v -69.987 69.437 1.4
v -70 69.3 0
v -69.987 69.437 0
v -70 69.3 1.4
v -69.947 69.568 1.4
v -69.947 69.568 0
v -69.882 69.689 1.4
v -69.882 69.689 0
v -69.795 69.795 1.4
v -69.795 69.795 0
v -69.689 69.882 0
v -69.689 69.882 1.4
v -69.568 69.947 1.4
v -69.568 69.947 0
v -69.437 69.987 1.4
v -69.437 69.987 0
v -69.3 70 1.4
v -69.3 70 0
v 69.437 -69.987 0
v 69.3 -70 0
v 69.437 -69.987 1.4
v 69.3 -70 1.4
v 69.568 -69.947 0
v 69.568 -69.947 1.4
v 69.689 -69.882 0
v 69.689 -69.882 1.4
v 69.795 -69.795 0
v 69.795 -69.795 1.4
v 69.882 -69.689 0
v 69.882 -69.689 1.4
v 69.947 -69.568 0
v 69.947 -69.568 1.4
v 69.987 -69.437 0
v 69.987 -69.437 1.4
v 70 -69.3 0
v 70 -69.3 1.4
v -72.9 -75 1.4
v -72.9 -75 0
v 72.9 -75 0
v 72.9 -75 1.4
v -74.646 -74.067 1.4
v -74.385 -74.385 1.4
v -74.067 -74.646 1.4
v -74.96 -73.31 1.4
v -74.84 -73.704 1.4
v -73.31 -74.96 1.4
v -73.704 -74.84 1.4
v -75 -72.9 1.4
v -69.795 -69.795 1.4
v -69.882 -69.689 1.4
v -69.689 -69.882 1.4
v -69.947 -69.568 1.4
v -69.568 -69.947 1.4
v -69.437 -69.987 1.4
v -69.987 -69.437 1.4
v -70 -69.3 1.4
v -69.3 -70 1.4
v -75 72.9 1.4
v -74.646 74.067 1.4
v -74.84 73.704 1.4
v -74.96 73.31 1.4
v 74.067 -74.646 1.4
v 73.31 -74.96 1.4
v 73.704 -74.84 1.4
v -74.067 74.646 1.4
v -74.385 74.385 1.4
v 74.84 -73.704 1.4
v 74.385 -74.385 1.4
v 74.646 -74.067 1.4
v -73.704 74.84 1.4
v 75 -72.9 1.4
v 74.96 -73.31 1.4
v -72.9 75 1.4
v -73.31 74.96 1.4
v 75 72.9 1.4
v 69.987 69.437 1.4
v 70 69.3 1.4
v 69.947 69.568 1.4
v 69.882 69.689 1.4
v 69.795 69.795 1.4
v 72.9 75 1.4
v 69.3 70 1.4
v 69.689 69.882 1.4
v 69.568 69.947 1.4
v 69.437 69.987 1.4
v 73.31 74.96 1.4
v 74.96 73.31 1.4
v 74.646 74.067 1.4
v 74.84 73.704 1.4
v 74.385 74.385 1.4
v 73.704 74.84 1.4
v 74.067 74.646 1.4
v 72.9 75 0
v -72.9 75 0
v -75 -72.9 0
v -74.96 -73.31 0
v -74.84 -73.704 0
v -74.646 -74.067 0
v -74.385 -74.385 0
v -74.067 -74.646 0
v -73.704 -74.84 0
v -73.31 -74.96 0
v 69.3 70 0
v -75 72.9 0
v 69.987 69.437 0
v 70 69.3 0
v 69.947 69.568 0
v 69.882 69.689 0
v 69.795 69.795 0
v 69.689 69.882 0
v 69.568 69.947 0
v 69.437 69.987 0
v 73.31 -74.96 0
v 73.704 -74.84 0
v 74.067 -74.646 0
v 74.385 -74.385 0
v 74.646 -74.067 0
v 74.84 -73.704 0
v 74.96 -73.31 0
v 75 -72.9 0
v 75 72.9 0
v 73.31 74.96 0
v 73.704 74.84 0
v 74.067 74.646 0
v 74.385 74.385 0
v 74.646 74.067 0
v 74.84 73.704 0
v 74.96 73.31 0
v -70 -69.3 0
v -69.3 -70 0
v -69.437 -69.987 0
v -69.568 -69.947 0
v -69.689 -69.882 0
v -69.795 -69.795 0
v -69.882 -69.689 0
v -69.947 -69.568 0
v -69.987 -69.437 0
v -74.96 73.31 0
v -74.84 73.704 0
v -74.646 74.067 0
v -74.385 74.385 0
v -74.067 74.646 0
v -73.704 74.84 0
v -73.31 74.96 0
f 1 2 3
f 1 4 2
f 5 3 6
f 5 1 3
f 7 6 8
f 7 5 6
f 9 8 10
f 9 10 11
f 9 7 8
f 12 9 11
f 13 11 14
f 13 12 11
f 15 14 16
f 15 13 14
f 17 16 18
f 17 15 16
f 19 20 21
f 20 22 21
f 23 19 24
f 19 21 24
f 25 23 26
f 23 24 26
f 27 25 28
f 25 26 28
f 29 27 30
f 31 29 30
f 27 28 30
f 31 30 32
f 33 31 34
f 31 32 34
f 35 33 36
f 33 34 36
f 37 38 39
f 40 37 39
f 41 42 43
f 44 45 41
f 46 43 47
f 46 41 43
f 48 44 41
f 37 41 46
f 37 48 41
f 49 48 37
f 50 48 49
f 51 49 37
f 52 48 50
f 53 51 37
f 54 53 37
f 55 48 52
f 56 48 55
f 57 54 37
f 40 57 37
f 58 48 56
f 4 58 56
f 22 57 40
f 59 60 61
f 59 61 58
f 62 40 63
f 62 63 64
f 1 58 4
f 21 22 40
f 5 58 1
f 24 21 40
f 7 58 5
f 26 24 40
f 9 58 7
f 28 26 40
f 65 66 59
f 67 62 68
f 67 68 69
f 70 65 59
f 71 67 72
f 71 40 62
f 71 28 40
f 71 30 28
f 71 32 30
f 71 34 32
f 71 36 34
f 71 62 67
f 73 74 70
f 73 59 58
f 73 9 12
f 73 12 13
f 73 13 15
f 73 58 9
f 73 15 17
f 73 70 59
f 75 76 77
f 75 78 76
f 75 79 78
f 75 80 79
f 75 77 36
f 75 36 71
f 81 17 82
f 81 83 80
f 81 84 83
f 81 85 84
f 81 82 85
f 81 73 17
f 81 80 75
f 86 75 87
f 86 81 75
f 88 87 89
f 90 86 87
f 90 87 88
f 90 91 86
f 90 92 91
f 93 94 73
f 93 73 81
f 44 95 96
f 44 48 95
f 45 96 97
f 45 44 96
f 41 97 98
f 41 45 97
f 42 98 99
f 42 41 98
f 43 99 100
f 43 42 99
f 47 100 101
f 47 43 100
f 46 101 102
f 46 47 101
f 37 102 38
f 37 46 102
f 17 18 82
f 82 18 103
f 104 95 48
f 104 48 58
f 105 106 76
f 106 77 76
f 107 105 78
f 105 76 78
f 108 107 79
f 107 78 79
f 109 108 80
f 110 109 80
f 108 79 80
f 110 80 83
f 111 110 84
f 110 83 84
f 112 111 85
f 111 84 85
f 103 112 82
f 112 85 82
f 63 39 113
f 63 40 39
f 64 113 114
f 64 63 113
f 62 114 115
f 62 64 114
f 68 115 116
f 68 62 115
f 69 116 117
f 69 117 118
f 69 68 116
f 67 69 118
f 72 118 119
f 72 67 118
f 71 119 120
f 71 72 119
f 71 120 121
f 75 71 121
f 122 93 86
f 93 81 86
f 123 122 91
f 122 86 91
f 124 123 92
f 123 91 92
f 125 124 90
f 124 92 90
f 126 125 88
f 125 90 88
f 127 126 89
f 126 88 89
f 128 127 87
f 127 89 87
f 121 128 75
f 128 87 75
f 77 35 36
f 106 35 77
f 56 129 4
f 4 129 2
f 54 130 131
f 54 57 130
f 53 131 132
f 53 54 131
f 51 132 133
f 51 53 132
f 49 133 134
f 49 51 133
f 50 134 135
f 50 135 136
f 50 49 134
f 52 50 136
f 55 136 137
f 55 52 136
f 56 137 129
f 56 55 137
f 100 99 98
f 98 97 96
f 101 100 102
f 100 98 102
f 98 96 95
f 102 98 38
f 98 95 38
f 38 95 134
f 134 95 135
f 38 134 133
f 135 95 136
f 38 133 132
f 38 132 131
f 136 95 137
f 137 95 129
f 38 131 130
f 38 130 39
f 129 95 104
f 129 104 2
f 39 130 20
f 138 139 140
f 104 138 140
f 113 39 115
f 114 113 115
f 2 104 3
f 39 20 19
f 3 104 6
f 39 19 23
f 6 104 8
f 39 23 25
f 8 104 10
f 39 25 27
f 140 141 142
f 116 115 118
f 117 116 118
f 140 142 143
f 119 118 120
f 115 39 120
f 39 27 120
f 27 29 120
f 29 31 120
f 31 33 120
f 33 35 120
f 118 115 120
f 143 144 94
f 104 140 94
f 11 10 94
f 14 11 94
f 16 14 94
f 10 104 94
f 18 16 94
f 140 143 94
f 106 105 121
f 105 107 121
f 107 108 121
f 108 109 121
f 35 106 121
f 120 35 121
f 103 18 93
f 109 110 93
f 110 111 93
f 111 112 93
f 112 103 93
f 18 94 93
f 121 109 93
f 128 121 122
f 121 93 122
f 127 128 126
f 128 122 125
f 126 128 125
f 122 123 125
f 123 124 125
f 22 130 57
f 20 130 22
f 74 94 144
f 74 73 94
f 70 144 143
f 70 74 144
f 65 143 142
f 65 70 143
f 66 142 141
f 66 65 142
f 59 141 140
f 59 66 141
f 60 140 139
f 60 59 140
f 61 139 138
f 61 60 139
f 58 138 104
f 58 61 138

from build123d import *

# Parameters (mm, degrees)
F0_W     = 150
F0_H     = 150
F0_W_2   = 140
F0_H_2   = 140
F1_DEPTH = 1.4
F2_R     = 2.1
F3_R     = 0.7
F4_R     = 2.1
F5_R     = 2.1
F6_R     = 0.7
F7_R     = 2.1
F8_R     = 0.7
F9_R     = 0.7


with BuildPart() as f1:
    # F0 (on Top) → F1 (new body)
    with BuildSketch(Plane.XY):
        Rectangle(F0_W, F0_H)
        Rectangle(F0_W_2, F0_H_2, mode=Mode.SUBTRACT)
    extrude(amount=F1_DEPTH)

    # F2
    f2_edges = [f1.edges().sort_by_distance(p)[0] for p in [
        (75, 75, 0.7),
    ]]
    fillet(f2_edges, radius=F2_R)

    # F3
    f3_edges = [f1.edges().sort_by_distance(p)[0] for p in [
        (70, 70, 0.7),
    ]]
    fillet(f3_edges, radius=F3_R)

    # F4
    f4_edges = [f1.edges().sort_by_distance(p)[0] for p in [
        (-75, 75, 0.7),
    ]]
    fillet(f4_edges, radius=F4_R)

    # F5
    f5_edges = [f1.edges().sort_by_distance(p)[0] for p in [
        (-75, -75, 0.7),
    ]]
    fillet(f5_edges, radius=F5_R)

    # F6
    f6_edges = [f1.edges().sort_by_distance(p)[0] for p in [
        (-70, -70, 0.7),
    ]]
    fillet(f6_edges, radius=F6_R)

    # F7
    f7_edges = [f1.edges().sort_by_distance(p)[0] for p in [
        (75, -75, 0.7),
    ]]
    fillet(f7_edges, radius=F7_R)

    # F8
    f8_edges = [f1.edges().sort_by_distance(p)[0] for p in [
        (70, -70, 0.7),
    ]]
    fillet(f8_edges, radius=F8_R)

    # F9
    f9_edges = [f1.edges().sort_by_distance(p)[0] for p in [
        (-70, 70, 0.7),
    ]]
    fillet(f9_edges, radius=F9_R)


solid = f1.part
